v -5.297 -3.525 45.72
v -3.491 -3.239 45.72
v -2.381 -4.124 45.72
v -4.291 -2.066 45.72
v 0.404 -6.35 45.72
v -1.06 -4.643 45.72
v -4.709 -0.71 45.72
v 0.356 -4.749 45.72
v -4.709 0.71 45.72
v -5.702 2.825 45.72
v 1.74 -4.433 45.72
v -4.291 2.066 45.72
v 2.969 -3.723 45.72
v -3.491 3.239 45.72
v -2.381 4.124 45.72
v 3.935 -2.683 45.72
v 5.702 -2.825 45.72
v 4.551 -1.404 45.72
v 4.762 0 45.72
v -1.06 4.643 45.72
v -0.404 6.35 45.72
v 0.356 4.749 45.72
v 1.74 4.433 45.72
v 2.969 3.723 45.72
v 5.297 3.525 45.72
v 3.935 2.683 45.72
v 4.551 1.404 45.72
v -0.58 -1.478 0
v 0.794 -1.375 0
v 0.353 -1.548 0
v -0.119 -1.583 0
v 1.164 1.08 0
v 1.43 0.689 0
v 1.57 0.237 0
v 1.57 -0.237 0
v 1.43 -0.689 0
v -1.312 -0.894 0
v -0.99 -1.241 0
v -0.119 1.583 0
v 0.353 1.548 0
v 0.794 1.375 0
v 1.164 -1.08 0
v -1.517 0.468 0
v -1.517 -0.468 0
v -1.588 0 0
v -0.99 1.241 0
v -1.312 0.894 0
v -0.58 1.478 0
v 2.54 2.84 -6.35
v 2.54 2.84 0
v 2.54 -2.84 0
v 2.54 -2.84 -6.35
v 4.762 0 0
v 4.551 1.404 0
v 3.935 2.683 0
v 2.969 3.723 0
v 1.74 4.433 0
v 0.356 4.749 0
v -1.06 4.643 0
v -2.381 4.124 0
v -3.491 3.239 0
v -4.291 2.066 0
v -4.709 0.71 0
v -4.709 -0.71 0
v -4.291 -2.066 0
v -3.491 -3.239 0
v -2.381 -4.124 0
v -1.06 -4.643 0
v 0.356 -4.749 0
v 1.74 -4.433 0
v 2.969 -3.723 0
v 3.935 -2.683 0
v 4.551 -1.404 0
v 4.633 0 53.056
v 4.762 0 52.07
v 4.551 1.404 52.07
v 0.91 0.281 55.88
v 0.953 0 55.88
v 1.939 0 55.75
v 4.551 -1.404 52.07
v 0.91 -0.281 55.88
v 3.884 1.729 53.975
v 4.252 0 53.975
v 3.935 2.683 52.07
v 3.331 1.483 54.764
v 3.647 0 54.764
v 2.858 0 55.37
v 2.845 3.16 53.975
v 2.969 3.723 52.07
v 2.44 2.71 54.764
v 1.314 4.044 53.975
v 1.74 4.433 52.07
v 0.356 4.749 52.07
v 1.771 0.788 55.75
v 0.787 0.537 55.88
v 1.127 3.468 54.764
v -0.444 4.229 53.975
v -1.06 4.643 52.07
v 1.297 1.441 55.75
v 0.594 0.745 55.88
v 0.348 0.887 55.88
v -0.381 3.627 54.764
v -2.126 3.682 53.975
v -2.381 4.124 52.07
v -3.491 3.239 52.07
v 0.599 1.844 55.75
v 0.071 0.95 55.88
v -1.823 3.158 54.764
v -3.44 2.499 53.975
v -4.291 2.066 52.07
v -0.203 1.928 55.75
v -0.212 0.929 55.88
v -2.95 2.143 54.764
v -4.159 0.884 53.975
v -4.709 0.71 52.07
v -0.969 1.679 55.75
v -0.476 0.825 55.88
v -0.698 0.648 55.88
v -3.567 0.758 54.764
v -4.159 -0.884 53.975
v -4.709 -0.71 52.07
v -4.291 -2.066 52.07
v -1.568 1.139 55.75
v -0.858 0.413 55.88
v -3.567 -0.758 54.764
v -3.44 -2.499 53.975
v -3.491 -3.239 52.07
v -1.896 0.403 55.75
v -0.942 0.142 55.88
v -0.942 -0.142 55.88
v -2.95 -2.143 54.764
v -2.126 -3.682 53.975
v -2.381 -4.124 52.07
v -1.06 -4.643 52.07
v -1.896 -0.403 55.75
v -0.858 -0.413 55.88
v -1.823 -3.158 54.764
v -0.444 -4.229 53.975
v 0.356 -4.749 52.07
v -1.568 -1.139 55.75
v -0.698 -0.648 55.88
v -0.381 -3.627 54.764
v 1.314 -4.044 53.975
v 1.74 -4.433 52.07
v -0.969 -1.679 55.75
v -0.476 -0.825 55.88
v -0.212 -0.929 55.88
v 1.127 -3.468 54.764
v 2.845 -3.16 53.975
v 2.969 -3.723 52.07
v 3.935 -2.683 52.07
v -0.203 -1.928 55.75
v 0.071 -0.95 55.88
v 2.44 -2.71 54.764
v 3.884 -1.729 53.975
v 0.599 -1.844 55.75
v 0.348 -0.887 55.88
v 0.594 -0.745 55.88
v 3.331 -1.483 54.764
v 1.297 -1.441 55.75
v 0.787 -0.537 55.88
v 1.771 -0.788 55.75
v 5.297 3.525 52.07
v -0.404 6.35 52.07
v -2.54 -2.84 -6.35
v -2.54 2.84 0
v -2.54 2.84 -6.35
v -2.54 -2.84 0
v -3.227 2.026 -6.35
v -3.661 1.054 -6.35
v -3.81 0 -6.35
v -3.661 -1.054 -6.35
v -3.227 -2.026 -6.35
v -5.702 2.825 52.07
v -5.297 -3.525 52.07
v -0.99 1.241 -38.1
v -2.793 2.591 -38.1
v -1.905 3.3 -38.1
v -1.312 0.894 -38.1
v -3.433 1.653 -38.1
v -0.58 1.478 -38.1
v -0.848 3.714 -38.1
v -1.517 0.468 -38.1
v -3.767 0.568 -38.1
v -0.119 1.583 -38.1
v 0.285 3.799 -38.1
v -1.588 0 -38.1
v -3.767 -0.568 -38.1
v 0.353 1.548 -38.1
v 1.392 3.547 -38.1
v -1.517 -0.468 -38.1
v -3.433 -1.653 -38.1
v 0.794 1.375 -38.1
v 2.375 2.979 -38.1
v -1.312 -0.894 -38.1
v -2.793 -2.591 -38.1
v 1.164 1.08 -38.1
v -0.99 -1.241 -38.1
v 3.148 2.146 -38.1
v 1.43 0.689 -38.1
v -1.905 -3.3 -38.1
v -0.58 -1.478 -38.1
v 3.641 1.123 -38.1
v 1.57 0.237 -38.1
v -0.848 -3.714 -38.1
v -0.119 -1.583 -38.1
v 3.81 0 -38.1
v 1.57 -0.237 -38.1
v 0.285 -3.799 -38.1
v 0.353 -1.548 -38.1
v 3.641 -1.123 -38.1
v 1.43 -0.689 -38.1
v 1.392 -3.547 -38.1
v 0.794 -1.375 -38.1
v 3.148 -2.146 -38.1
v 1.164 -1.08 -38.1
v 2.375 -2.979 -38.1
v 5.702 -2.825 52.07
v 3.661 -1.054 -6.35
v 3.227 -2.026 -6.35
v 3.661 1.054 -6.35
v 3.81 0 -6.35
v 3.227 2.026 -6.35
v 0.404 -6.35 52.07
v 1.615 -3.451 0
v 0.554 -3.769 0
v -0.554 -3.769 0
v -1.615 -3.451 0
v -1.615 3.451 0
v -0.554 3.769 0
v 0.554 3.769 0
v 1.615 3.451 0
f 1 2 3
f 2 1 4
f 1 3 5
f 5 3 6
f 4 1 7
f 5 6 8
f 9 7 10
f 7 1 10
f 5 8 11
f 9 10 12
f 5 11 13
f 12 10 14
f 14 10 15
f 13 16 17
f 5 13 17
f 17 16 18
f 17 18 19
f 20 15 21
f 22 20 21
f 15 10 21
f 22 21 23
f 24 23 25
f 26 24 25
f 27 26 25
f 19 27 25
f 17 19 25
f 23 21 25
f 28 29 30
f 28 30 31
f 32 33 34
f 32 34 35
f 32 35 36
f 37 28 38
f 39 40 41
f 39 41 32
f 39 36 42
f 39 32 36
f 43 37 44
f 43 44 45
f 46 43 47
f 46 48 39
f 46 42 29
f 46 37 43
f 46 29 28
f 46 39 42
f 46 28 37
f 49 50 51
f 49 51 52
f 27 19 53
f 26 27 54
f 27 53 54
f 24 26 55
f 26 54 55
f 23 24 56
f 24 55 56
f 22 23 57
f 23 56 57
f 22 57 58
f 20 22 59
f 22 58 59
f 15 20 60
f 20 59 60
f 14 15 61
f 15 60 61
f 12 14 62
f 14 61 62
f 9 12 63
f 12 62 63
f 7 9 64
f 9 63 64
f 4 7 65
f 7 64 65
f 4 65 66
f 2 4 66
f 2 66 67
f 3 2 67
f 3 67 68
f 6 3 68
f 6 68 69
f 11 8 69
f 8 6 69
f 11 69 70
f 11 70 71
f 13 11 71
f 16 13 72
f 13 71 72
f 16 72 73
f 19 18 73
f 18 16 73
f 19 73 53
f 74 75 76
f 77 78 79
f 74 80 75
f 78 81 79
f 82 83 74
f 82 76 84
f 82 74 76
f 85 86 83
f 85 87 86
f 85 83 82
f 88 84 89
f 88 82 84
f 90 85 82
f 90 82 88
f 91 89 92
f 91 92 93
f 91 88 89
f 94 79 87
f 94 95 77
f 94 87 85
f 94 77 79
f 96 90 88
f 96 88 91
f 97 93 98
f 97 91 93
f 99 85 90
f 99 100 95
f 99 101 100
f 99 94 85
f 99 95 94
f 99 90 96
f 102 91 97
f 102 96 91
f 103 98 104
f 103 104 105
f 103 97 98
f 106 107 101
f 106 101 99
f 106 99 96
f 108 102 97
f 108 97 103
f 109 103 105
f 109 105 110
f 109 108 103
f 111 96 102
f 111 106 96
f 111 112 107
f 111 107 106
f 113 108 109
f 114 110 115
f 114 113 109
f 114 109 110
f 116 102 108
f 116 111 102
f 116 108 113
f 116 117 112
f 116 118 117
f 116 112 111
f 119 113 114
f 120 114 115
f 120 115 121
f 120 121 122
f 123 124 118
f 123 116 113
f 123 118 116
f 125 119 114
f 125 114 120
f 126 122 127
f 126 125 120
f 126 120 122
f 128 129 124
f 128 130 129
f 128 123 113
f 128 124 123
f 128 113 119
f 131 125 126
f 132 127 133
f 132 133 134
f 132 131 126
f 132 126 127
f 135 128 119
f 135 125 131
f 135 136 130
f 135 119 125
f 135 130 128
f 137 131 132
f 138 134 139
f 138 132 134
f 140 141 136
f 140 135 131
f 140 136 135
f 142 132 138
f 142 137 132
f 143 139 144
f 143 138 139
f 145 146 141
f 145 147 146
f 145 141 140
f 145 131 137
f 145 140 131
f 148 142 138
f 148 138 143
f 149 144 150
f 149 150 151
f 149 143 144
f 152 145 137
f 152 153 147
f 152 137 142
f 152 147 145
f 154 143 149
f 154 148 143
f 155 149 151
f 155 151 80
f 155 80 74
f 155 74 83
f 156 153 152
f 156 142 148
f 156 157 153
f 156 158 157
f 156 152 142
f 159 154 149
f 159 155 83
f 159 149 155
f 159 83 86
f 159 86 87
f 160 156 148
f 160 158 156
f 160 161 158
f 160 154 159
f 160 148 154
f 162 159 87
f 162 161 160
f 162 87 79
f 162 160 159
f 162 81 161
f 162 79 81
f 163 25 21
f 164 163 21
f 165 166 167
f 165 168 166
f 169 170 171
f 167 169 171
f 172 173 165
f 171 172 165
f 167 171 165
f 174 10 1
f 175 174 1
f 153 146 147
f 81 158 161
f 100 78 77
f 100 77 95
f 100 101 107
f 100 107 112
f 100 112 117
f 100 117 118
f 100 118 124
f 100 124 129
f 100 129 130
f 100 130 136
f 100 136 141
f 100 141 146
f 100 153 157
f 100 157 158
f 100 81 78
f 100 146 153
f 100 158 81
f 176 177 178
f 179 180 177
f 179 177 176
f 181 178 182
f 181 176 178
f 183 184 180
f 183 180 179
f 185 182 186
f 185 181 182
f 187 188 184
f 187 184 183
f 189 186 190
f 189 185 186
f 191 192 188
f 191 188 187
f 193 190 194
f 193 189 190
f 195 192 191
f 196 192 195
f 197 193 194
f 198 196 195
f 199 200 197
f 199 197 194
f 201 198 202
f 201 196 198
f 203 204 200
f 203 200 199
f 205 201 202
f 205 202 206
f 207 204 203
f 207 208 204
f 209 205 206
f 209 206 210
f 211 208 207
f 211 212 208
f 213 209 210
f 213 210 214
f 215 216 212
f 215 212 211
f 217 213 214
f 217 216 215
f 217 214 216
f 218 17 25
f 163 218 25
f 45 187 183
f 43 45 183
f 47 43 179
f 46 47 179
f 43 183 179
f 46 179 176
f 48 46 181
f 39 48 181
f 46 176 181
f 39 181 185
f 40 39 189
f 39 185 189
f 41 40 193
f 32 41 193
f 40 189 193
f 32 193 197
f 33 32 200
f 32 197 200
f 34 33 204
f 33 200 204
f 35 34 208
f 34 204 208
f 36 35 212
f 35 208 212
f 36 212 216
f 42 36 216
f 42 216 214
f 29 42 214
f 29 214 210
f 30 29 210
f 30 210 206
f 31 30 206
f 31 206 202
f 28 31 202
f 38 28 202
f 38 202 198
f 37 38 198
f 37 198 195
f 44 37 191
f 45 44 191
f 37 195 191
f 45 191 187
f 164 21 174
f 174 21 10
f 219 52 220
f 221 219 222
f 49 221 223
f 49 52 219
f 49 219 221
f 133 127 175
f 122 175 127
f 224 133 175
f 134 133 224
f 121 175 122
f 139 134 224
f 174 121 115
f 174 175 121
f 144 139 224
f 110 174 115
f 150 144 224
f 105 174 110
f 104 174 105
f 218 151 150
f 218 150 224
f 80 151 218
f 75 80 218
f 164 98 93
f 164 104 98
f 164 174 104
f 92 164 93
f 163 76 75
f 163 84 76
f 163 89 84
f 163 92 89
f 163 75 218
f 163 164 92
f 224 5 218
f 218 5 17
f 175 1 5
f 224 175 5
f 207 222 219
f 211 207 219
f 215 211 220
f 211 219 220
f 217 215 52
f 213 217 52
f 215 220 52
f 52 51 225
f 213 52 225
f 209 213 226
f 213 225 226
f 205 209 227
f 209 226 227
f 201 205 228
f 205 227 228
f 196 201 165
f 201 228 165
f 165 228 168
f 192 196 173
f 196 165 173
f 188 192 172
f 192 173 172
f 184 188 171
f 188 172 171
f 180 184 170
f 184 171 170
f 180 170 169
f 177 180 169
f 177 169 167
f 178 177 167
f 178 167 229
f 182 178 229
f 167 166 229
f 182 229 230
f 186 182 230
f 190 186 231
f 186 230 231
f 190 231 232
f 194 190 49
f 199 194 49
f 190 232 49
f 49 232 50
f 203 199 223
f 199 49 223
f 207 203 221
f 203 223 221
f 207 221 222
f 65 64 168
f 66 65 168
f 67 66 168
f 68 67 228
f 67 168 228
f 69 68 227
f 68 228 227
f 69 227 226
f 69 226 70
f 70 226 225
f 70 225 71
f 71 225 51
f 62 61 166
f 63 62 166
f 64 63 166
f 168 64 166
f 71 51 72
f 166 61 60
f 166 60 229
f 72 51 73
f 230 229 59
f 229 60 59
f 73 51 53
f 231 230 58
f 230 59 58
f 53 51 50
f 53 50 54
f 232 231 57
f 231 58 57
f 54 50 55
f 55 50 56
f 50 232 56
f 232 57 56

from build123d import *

# Parameters (mm, degrees)
SKETCH1_R           = 4.7625
BOSS_EXTRUDE1_DEPTH = 55.88
SKETCH2_R           = 3.81
BOSS_EXTRUDE2_DEPTH = 38.1
SKETCH3_W           = 1.27
SKETCH3_H           = 6.35
CUT_EXTRUDE1_DEPTH  = 19.05
SKETCH4_R           = 1.5875
CUT_EXTRUDE2_DEPTH  = 38.1
FILLET2_R           = 3.81
BOSS_EXTRUDE3_START = 45.72
BOSS_EXTRUDE3_DEPTH = 6.35


with BuildPart() as part:
    # Sketch1 → Boss-Extrude1 (new body)
    with BuildSketch(Plane.XY):
        Circle(SKETCH1_R)
    extrude(amount=BOSS_EXTRUDE1_DEPTH)

    # Sketch2 → Boss-Extrude2 (add)
    with BuildSketch(Plane(origin=(0, 0, 0), x_dir=(-1, 0, 0), z_dir=(0, 0, -1))):
        with Locations(Location((0, 0, 0), (0, 0, 180))):
            Circle(SKETCH2_R)
    extrude(amount=BOSS_EXTRUDE2_DEPTH)

    # Sketch3 → Cut-Extrude1 (cut, symmetric)
    with BuildSketch(Plane(origin=(0, 0, 0), x_dir=(1, 0, 0), z_dir=(0, 1, 0))):
        with Locations((-3.175, 3.175)):
            Rectangle(SKETCH3_W, SKETCH3_H)
        with Locations((3.175, 3.175)):
            Rectangle(SKETCH3_W, SKETCH3_H)
    extrude(amount=CUT_EXTRUDE1_DEPTH, both=True, mode=Mode.SUBTRACT)

    # Sketch4 → Cut-Extrude2 (cut)
    with BuildSketch(Plane(origin=(0, 0, -38.1), x_dir=(-1, 0, 0), z_dir=(0, 0, -1))):
        Circle(SKETCH4_R)
    extrude(amount=-CUT_EXTRUDE2_DEPTH, mode=Mode.SUBTRACT)

    # Fillet2
    fillet2_edges = [part.edges().sort_by_distance(p)[0] for p in [
        (-4.7625, 0, 55.88),
    ]]
    fillet(fillet2_edges, radius=FILLET2_R)

    # Sketch7 → Boss-Extrude3 (add)
    with BuildSketch(Plane.XY.offset(BOSS_EXTRUDE3_START)):
        Polygon((5.701507332, -2.824699621), (5.297015296, 3.525300379), (-0.404492036, 6.35), (-5.701507332, 2.824699621), (-5.297015296, -3.525300379), (0.404492036, -6.35), align=None)
    extrude(amount=BOSS_EXTRUDE3_DEPTH)


solid = part.part
